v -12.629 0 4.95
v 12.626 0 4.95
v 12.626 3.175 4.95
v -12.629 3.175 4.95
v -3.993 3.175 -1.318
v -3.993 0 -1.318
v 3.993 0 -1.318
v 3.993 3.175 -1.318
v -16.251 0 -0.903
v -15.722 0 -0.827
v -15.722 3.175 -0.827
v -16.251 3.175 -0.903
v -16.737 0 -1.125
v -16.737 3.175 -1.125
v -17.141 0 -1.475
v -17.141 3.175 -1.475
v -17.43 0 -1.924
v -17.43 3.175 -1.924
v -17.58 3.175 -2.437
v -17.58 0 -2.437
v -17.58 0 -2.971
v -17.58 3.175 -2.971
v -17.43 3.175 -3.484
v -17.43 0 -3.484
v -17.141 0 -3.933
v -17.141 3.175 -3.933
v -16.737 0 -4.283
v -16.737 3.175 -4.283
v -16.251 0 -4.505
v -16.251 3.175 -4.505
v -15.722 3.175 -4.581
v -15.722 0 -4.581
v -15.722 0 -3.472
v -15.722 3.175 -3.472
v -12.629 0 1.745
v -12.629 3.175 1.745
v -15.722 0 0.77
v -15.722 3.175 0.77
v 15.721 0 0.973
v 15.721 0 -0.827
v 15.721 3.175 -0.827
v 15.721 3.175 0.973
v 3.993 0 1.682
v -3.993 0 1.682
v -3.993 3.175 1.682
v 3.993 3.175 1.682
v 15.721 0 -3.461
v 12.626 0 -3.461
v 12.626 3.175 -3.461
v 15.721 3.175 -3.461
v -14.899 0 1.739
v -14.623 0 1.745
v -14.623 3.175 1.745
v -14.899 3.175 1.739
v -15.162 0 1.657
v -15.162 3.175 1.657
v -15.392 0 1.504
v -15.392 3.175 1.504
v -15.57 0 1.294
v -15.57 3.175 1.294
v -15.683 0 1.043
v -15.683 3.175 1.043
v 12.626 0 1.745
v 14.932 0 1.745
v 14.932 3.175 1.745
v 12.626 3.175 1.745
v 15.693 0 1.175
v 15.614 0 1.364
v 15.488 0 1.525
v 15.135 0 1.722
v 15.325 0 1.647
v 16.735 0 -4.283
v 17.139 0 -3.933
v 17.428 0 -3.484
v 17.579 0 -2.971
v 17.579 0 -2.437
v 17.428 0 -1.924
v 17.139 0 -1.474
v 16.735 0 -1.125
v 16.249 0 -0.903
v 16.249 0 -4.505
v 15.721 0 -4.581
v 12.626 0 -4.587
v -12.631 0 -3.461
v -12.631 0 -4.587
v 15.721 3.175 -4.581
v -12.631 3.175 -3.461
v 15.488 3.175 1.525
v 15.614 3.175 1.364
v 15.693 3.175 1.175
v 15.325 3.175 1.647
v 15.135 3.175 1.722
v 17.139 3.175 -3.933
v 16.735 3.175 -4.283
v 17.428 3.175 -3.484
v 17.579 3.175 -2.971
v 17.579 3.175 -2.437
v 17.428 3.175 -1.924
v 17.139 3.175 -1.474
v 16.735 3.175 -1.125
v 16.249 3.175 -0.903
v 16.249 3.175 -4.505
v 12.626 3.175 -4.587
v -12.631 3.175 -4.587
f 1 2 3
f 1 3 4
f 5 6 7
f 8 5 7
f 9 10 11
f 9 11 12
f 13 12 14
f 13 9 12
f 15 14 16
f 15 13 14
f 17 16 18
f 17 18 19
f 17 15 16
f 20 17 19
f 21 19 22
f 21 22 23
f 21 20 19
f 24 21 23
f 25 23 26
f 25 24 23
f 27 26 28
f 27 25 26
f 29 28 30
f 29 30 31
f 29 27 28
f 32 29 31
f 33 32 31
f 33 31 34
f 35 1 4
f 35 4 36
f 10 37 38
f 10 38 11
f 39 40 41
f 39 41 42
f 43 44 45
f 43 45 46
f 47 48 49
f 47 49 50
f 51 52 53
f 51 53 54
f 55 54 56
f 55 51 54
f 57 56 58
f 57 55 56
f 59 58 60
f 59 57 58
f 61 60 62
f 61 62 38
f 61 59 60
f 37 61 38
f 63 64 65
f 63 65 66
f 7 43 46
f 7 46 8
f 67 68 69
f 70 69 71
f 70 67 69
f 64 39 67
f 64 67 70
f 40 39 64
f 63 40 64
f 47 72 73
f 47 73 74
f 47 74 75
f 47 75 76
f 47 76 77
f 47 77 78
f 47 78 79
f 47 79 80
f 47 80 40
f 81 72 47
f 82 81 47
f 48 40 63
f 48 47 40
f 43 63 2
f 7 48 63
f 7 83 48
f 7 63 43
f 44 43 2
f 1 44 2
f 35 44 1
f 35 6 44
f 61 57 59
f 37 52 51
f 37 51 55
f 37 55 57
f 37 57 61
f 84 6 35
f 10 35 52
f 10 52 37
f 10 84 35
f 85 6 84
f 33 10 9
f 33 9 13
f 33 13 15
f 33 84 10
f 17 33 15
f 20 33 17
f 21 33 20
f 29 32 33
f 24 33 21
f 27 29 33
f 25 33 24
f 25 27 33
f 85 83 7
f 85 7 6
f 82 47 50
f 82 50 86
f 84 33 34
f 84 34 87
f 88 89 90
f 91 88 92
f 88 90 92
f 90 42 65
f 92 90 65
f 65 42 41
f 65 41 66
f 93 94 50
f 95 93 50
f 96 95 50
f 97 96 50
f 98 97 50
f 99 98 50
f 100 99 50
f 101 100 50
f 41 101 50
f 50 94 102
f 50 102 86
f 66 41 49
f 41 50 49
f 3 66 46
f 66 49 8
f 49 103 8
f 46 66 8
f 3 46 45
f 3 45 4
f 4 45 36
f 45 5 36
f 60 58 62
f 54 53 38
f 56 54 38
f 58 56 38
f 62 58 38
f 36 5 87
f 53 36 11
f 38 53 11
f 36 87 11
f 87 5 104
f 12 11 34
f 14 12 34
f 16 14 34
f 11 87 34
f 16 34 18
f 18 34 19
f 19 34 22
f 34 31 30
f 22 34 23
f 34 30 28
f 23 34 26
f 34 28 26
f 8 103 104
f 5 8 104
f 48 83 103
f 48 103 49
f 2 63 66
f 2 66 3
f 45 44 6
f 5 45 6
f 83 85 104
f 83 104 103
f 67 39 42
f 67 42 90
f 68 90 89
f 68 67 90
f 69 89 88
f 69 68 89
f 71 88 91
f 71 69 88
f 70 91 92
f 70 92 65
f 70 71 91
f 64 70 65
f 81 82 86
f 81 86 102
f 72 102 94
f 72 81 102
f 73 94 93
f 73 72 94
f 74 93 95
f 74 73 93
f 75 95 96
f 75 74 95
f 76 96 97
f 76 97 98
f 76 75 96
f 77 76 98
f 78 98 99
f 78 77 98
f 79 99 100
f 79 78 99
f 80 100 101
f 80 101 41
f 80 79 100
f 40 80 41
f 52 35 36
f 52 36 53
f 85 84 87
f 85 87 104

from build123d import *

# Parameters (mm, degrees)
SKETCH2_W           = 7.98583157
SKETCH2_H           = 3.000090293
BOSS_EXTRUDE1_DEPTH = 3.175


with BuildPart() as part:
    # Sketch2 → Boss-Extrude1 (new body)
    with BuildSketch(Plane(origin=(0, 0, 0), x_dir=(1, 0, 0), z_dir=(0, 1, 0))):
        with BuildLine():
            Line((12.625998491, -1.744524944), (12.625998491, -4.950391186))
            Line((12.625998491, -4.950391186), (-12.629130241, -4.950391186))
            Line((-12.629130241, -4.950391186), (-12.629130241, -1.744524944))
            Line((-12.629130241, -1.744524944), (-14.623097356, -1.744524944))
            ThreePointArc((-14.623097356, -1.744524944), (-15.39182083, -1.504361603), (-15.722173536, -0.769867695))
            Line((-15.722173536, -0.769867695), (-15.722173536, 0.826844293))
            ThreePointArc((-15.722173536, 0.826844293), (-17.599363905, 2.704034662), (-15.722173536, 4.581225032))
            Line((-15.722173536, 4.581225032), (-15.722173536, 3.471753772))
            Line((-15.722173536, 3.471753772), (-12.631299313, 3.460874113))
            Line((-12.631299313, 3.460874113), (-12.631299313, 4.586967616))
            Line((-12.631299313, 4.586967616), (12.625998491, 4.586967616))
            Line((12.625998491, 4.586967616), (12.625998491, 3.460874113))
            Line((12.625998491, 3.460874113), (15.720511393, 3.460874113))
            Line((15.720511393, 3.460874113), (15.720511393, 4.581225031))
            ThreePointArc((15.720511393, 4.581225031), (17.597858023, 2.703878401), (15.720511393, 0.826531771))
            Line((15.720511393, 0.826531771), (15.720511393, -0.972713755))
            ThreePointArc((15.720511393, -0.972713755), (15.488390746, -1.524540285), (14.931614971, -1.744524944))
            Line((14.931614971, -1.744524944), (12.625998491, -1.744524944))
        make_face()
        with Locations((2.437e-06, -0.181702019)):
            Rectangle(SKETCH2_W, SKETCH2_H, mode=Mode.SUBTRACT)
    extrude(amount=BOSS_EXTRUDE1_DEPTH)


solid = part.part
